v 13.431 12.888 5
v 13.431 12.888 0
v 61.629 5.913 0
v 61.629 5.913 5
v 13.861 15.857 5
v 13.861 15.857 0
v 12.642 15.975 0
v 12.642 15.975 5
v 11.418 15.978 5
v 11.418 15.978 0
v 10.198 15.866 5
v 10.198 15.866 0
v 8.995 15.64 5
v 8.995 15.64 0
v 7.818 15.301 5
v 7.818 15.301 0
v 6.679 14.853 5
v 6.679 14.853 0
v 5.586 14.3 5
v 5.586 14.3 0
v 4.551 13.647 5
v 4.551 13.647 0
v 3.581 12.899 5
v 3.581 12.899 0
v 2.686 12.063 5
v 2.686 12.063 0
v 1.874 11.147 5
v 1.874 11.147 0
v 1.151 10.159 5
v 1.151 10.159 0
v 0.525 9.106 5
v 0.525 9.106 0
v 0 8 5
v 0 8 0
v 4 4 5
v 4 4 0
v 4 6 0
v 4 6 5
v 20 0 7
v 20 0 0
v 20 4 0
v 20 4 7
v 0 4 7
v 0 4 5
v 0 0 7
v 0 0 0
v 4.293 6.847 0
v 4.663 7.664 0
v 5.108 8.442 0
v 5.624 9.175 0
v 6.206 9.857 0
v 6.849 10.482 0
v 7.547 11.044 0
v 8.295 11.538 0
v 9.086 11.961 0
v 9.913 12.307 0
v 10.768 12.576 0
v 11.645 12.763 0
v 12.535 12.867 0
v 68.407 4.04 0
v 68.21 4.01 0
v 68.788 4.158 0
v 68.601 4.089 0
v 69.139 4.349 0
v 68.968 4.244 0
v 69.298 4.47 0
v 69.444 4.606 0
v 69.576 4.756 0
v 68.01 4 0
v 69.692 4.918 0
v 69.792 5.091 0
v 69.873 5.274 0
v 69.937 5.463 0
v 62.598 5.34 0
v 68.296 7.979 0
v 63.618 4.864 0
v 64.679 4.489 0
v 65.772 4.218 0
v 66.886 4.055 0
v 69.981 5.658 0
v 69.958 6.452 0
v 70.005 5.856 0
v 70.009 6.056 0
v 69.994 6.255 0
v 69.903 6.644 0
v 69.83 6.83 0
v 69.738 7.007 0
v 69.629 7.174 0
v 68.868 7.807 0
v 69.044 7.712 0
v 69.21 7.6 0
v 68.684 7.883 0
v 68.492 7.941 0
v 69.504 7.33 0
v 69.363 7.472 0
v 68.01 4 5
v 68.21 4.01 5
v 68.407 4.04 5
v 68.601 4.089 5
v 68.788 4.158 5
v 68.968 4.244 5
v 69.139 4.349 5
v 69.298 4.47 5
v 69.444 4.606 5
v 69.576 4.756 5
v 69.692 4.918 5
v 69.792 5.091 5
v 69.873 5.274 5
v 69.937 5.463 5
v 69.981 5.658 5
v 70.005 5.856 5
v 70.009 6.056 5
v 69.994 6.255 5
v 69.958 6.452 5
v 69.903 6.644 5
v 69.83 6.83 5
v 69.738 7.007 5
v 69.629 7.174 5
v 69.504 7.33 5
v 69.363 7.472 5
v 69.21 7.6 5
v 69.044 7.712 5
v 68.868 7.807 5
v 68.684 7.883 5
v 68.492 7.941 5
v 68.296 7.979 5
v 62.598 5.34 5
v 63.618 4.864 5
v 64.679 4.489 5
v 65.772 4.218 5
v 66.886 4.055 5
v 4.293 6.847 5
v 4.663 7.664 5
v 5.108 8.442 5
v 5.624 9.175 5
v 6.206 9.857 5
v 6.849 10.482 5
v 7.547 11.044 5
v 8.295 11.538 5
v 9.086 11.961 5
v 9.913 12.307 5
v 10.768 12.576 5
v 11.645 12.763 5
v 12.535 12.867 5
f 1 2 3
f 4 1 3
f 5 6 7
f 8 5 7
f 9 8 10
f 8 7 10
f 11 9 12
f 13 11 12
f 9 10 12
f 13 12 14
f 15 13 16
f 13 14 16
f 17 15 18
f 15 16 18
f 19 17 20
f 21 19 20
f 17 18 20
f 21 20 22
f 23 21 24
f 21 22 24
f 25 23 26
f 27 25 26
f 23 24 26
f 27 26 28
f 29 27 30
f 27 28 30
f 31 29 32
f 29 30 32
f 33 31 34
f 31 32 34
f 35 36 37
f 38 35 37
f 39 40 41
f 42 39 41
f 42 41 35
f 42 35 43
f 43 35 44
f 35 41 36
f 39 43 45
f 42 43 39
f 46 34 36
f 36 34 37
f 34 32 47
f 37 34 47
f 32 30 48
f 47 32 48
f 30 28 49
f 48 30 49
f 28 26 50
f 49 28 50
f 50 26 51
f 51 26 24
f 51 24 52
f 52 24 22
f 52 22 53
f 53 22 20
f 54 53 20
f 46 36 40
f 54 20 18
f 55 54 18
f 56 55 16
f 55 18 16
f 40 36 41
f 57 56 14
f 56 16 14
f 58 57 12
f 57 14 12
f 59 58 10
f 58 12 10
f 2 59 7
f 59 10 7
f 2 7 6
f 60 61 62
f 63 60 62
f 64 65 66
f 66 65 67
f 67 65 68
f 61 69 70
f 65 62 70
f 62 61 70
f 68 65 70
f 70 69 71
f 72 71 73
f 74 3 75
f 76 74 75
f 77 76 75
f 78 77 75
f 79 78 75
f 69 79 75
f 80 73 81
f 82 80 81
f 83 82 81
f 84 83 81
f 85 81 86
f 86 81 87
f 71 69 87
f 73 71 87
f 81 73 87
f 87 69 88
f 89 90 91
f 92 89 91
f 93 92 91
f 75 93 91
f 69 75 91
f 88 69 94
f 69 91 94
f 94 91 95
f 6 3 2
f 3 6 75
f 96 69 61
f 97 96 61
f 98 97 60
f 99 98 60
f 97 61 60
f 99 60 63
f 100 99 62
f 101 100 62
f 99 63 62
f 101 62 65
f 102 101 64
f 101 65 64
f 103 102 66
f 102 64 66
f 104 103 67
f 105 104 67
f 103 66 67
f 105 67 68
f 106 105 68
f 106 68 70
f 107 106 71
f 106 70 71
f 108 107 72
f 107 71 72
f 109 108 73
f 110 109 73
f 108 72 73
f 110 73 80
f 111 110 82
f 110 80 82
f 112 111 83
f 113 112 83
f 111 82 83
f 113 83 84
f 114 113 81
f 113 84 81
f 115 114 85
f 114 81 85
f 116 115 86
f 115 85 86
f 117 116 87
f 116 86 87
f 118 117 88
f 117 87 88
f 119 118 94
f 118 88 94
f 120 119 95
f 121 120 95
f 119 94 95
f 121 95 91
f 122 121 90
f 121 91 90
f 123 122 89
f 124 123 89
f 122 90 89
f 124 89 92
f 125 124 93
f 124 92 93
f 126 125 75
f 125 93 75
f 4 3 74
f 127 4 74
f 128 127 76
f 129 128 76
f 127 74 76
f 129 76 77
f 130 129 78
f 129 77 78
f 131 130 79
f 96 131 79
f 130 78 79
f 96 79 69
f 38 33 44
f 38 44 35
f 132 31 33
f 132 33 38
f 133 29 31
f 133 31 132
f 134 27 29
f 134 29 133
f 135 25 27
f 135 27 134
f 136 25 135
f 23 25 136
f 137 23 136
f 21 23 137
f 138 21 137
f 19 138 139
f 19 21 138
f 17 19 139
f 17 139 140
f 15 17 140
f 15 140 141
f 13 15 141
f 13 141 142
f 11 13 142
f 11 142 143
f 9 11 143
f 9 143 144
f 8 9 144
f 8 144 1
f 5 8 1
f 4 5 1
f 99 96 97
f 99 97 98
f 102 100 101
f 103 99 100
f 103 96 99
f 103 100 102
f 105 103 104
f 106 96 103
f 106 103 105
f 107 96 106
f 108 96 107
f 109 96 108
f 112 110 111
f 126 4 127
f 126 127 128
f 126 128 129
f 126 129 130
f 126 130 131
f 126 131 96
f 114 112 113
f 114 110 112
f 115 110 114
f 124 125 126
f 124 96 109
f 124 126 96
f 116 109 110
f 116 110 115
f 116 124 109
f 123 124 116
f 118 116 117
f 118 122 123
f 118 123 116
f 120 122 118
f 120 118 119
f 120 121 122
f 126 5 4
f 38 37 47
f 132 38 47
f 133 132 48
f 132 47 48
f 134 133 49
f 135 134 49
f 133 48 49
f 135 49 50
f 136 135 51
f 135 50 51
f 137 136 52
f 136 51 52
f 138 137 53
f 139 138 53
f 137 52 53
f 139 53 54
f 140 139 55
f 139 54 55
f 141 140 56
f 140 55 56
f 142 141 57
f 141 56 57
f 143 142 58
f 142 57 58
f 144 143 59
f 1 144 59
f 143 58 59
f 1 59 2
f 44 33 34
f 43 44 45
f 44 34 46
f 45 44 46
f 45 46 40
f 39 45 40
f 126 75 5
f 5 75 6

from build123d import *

# Parameters (mm, degrees)
F1_DEPTH = 5
F2_DEPTH = 7


with BuildPart() as f1:
    # F0 (on Top) → F1 (new body)
    with BuildSketch(Plane.XY):
        with BuildLine():
            ThreePointArc((61.629022, 5.913021), (64.679214, 4.488544), (68.009999, 4))
            ThreePointArc((68.009999, 4), (70.004837, 5.856404), (68.29645, 7.97938))
            Line((68.29645, 7.97938), (13.861023, 15.857132))
            ThreePointArc((13.861023, 15.857132), (5.586179, 14.300147), (0, 8))
            Line((0, 8), (0, 4))
            Line((0, 4), (4, 4))
            Line((4, 4), (4, 6))
            ThreePointArc((4, 6), (7.547234, 11.043894), (13.431347, 12.888062))
            Line((13.431347, 12.888062), (61.629022, 5.913021))
        make_face()
    extrude(amount=F1_DEPTH)

    # F0 (on Top) → F2 (join)
    with BuildSketch(Plane.XY):
        Polygon((4, 4), (0, 4), (0, 0), (20, 0), (20, 4), align=None)
    extrude(amount=F2_DEPTH)


solid = f1.part
